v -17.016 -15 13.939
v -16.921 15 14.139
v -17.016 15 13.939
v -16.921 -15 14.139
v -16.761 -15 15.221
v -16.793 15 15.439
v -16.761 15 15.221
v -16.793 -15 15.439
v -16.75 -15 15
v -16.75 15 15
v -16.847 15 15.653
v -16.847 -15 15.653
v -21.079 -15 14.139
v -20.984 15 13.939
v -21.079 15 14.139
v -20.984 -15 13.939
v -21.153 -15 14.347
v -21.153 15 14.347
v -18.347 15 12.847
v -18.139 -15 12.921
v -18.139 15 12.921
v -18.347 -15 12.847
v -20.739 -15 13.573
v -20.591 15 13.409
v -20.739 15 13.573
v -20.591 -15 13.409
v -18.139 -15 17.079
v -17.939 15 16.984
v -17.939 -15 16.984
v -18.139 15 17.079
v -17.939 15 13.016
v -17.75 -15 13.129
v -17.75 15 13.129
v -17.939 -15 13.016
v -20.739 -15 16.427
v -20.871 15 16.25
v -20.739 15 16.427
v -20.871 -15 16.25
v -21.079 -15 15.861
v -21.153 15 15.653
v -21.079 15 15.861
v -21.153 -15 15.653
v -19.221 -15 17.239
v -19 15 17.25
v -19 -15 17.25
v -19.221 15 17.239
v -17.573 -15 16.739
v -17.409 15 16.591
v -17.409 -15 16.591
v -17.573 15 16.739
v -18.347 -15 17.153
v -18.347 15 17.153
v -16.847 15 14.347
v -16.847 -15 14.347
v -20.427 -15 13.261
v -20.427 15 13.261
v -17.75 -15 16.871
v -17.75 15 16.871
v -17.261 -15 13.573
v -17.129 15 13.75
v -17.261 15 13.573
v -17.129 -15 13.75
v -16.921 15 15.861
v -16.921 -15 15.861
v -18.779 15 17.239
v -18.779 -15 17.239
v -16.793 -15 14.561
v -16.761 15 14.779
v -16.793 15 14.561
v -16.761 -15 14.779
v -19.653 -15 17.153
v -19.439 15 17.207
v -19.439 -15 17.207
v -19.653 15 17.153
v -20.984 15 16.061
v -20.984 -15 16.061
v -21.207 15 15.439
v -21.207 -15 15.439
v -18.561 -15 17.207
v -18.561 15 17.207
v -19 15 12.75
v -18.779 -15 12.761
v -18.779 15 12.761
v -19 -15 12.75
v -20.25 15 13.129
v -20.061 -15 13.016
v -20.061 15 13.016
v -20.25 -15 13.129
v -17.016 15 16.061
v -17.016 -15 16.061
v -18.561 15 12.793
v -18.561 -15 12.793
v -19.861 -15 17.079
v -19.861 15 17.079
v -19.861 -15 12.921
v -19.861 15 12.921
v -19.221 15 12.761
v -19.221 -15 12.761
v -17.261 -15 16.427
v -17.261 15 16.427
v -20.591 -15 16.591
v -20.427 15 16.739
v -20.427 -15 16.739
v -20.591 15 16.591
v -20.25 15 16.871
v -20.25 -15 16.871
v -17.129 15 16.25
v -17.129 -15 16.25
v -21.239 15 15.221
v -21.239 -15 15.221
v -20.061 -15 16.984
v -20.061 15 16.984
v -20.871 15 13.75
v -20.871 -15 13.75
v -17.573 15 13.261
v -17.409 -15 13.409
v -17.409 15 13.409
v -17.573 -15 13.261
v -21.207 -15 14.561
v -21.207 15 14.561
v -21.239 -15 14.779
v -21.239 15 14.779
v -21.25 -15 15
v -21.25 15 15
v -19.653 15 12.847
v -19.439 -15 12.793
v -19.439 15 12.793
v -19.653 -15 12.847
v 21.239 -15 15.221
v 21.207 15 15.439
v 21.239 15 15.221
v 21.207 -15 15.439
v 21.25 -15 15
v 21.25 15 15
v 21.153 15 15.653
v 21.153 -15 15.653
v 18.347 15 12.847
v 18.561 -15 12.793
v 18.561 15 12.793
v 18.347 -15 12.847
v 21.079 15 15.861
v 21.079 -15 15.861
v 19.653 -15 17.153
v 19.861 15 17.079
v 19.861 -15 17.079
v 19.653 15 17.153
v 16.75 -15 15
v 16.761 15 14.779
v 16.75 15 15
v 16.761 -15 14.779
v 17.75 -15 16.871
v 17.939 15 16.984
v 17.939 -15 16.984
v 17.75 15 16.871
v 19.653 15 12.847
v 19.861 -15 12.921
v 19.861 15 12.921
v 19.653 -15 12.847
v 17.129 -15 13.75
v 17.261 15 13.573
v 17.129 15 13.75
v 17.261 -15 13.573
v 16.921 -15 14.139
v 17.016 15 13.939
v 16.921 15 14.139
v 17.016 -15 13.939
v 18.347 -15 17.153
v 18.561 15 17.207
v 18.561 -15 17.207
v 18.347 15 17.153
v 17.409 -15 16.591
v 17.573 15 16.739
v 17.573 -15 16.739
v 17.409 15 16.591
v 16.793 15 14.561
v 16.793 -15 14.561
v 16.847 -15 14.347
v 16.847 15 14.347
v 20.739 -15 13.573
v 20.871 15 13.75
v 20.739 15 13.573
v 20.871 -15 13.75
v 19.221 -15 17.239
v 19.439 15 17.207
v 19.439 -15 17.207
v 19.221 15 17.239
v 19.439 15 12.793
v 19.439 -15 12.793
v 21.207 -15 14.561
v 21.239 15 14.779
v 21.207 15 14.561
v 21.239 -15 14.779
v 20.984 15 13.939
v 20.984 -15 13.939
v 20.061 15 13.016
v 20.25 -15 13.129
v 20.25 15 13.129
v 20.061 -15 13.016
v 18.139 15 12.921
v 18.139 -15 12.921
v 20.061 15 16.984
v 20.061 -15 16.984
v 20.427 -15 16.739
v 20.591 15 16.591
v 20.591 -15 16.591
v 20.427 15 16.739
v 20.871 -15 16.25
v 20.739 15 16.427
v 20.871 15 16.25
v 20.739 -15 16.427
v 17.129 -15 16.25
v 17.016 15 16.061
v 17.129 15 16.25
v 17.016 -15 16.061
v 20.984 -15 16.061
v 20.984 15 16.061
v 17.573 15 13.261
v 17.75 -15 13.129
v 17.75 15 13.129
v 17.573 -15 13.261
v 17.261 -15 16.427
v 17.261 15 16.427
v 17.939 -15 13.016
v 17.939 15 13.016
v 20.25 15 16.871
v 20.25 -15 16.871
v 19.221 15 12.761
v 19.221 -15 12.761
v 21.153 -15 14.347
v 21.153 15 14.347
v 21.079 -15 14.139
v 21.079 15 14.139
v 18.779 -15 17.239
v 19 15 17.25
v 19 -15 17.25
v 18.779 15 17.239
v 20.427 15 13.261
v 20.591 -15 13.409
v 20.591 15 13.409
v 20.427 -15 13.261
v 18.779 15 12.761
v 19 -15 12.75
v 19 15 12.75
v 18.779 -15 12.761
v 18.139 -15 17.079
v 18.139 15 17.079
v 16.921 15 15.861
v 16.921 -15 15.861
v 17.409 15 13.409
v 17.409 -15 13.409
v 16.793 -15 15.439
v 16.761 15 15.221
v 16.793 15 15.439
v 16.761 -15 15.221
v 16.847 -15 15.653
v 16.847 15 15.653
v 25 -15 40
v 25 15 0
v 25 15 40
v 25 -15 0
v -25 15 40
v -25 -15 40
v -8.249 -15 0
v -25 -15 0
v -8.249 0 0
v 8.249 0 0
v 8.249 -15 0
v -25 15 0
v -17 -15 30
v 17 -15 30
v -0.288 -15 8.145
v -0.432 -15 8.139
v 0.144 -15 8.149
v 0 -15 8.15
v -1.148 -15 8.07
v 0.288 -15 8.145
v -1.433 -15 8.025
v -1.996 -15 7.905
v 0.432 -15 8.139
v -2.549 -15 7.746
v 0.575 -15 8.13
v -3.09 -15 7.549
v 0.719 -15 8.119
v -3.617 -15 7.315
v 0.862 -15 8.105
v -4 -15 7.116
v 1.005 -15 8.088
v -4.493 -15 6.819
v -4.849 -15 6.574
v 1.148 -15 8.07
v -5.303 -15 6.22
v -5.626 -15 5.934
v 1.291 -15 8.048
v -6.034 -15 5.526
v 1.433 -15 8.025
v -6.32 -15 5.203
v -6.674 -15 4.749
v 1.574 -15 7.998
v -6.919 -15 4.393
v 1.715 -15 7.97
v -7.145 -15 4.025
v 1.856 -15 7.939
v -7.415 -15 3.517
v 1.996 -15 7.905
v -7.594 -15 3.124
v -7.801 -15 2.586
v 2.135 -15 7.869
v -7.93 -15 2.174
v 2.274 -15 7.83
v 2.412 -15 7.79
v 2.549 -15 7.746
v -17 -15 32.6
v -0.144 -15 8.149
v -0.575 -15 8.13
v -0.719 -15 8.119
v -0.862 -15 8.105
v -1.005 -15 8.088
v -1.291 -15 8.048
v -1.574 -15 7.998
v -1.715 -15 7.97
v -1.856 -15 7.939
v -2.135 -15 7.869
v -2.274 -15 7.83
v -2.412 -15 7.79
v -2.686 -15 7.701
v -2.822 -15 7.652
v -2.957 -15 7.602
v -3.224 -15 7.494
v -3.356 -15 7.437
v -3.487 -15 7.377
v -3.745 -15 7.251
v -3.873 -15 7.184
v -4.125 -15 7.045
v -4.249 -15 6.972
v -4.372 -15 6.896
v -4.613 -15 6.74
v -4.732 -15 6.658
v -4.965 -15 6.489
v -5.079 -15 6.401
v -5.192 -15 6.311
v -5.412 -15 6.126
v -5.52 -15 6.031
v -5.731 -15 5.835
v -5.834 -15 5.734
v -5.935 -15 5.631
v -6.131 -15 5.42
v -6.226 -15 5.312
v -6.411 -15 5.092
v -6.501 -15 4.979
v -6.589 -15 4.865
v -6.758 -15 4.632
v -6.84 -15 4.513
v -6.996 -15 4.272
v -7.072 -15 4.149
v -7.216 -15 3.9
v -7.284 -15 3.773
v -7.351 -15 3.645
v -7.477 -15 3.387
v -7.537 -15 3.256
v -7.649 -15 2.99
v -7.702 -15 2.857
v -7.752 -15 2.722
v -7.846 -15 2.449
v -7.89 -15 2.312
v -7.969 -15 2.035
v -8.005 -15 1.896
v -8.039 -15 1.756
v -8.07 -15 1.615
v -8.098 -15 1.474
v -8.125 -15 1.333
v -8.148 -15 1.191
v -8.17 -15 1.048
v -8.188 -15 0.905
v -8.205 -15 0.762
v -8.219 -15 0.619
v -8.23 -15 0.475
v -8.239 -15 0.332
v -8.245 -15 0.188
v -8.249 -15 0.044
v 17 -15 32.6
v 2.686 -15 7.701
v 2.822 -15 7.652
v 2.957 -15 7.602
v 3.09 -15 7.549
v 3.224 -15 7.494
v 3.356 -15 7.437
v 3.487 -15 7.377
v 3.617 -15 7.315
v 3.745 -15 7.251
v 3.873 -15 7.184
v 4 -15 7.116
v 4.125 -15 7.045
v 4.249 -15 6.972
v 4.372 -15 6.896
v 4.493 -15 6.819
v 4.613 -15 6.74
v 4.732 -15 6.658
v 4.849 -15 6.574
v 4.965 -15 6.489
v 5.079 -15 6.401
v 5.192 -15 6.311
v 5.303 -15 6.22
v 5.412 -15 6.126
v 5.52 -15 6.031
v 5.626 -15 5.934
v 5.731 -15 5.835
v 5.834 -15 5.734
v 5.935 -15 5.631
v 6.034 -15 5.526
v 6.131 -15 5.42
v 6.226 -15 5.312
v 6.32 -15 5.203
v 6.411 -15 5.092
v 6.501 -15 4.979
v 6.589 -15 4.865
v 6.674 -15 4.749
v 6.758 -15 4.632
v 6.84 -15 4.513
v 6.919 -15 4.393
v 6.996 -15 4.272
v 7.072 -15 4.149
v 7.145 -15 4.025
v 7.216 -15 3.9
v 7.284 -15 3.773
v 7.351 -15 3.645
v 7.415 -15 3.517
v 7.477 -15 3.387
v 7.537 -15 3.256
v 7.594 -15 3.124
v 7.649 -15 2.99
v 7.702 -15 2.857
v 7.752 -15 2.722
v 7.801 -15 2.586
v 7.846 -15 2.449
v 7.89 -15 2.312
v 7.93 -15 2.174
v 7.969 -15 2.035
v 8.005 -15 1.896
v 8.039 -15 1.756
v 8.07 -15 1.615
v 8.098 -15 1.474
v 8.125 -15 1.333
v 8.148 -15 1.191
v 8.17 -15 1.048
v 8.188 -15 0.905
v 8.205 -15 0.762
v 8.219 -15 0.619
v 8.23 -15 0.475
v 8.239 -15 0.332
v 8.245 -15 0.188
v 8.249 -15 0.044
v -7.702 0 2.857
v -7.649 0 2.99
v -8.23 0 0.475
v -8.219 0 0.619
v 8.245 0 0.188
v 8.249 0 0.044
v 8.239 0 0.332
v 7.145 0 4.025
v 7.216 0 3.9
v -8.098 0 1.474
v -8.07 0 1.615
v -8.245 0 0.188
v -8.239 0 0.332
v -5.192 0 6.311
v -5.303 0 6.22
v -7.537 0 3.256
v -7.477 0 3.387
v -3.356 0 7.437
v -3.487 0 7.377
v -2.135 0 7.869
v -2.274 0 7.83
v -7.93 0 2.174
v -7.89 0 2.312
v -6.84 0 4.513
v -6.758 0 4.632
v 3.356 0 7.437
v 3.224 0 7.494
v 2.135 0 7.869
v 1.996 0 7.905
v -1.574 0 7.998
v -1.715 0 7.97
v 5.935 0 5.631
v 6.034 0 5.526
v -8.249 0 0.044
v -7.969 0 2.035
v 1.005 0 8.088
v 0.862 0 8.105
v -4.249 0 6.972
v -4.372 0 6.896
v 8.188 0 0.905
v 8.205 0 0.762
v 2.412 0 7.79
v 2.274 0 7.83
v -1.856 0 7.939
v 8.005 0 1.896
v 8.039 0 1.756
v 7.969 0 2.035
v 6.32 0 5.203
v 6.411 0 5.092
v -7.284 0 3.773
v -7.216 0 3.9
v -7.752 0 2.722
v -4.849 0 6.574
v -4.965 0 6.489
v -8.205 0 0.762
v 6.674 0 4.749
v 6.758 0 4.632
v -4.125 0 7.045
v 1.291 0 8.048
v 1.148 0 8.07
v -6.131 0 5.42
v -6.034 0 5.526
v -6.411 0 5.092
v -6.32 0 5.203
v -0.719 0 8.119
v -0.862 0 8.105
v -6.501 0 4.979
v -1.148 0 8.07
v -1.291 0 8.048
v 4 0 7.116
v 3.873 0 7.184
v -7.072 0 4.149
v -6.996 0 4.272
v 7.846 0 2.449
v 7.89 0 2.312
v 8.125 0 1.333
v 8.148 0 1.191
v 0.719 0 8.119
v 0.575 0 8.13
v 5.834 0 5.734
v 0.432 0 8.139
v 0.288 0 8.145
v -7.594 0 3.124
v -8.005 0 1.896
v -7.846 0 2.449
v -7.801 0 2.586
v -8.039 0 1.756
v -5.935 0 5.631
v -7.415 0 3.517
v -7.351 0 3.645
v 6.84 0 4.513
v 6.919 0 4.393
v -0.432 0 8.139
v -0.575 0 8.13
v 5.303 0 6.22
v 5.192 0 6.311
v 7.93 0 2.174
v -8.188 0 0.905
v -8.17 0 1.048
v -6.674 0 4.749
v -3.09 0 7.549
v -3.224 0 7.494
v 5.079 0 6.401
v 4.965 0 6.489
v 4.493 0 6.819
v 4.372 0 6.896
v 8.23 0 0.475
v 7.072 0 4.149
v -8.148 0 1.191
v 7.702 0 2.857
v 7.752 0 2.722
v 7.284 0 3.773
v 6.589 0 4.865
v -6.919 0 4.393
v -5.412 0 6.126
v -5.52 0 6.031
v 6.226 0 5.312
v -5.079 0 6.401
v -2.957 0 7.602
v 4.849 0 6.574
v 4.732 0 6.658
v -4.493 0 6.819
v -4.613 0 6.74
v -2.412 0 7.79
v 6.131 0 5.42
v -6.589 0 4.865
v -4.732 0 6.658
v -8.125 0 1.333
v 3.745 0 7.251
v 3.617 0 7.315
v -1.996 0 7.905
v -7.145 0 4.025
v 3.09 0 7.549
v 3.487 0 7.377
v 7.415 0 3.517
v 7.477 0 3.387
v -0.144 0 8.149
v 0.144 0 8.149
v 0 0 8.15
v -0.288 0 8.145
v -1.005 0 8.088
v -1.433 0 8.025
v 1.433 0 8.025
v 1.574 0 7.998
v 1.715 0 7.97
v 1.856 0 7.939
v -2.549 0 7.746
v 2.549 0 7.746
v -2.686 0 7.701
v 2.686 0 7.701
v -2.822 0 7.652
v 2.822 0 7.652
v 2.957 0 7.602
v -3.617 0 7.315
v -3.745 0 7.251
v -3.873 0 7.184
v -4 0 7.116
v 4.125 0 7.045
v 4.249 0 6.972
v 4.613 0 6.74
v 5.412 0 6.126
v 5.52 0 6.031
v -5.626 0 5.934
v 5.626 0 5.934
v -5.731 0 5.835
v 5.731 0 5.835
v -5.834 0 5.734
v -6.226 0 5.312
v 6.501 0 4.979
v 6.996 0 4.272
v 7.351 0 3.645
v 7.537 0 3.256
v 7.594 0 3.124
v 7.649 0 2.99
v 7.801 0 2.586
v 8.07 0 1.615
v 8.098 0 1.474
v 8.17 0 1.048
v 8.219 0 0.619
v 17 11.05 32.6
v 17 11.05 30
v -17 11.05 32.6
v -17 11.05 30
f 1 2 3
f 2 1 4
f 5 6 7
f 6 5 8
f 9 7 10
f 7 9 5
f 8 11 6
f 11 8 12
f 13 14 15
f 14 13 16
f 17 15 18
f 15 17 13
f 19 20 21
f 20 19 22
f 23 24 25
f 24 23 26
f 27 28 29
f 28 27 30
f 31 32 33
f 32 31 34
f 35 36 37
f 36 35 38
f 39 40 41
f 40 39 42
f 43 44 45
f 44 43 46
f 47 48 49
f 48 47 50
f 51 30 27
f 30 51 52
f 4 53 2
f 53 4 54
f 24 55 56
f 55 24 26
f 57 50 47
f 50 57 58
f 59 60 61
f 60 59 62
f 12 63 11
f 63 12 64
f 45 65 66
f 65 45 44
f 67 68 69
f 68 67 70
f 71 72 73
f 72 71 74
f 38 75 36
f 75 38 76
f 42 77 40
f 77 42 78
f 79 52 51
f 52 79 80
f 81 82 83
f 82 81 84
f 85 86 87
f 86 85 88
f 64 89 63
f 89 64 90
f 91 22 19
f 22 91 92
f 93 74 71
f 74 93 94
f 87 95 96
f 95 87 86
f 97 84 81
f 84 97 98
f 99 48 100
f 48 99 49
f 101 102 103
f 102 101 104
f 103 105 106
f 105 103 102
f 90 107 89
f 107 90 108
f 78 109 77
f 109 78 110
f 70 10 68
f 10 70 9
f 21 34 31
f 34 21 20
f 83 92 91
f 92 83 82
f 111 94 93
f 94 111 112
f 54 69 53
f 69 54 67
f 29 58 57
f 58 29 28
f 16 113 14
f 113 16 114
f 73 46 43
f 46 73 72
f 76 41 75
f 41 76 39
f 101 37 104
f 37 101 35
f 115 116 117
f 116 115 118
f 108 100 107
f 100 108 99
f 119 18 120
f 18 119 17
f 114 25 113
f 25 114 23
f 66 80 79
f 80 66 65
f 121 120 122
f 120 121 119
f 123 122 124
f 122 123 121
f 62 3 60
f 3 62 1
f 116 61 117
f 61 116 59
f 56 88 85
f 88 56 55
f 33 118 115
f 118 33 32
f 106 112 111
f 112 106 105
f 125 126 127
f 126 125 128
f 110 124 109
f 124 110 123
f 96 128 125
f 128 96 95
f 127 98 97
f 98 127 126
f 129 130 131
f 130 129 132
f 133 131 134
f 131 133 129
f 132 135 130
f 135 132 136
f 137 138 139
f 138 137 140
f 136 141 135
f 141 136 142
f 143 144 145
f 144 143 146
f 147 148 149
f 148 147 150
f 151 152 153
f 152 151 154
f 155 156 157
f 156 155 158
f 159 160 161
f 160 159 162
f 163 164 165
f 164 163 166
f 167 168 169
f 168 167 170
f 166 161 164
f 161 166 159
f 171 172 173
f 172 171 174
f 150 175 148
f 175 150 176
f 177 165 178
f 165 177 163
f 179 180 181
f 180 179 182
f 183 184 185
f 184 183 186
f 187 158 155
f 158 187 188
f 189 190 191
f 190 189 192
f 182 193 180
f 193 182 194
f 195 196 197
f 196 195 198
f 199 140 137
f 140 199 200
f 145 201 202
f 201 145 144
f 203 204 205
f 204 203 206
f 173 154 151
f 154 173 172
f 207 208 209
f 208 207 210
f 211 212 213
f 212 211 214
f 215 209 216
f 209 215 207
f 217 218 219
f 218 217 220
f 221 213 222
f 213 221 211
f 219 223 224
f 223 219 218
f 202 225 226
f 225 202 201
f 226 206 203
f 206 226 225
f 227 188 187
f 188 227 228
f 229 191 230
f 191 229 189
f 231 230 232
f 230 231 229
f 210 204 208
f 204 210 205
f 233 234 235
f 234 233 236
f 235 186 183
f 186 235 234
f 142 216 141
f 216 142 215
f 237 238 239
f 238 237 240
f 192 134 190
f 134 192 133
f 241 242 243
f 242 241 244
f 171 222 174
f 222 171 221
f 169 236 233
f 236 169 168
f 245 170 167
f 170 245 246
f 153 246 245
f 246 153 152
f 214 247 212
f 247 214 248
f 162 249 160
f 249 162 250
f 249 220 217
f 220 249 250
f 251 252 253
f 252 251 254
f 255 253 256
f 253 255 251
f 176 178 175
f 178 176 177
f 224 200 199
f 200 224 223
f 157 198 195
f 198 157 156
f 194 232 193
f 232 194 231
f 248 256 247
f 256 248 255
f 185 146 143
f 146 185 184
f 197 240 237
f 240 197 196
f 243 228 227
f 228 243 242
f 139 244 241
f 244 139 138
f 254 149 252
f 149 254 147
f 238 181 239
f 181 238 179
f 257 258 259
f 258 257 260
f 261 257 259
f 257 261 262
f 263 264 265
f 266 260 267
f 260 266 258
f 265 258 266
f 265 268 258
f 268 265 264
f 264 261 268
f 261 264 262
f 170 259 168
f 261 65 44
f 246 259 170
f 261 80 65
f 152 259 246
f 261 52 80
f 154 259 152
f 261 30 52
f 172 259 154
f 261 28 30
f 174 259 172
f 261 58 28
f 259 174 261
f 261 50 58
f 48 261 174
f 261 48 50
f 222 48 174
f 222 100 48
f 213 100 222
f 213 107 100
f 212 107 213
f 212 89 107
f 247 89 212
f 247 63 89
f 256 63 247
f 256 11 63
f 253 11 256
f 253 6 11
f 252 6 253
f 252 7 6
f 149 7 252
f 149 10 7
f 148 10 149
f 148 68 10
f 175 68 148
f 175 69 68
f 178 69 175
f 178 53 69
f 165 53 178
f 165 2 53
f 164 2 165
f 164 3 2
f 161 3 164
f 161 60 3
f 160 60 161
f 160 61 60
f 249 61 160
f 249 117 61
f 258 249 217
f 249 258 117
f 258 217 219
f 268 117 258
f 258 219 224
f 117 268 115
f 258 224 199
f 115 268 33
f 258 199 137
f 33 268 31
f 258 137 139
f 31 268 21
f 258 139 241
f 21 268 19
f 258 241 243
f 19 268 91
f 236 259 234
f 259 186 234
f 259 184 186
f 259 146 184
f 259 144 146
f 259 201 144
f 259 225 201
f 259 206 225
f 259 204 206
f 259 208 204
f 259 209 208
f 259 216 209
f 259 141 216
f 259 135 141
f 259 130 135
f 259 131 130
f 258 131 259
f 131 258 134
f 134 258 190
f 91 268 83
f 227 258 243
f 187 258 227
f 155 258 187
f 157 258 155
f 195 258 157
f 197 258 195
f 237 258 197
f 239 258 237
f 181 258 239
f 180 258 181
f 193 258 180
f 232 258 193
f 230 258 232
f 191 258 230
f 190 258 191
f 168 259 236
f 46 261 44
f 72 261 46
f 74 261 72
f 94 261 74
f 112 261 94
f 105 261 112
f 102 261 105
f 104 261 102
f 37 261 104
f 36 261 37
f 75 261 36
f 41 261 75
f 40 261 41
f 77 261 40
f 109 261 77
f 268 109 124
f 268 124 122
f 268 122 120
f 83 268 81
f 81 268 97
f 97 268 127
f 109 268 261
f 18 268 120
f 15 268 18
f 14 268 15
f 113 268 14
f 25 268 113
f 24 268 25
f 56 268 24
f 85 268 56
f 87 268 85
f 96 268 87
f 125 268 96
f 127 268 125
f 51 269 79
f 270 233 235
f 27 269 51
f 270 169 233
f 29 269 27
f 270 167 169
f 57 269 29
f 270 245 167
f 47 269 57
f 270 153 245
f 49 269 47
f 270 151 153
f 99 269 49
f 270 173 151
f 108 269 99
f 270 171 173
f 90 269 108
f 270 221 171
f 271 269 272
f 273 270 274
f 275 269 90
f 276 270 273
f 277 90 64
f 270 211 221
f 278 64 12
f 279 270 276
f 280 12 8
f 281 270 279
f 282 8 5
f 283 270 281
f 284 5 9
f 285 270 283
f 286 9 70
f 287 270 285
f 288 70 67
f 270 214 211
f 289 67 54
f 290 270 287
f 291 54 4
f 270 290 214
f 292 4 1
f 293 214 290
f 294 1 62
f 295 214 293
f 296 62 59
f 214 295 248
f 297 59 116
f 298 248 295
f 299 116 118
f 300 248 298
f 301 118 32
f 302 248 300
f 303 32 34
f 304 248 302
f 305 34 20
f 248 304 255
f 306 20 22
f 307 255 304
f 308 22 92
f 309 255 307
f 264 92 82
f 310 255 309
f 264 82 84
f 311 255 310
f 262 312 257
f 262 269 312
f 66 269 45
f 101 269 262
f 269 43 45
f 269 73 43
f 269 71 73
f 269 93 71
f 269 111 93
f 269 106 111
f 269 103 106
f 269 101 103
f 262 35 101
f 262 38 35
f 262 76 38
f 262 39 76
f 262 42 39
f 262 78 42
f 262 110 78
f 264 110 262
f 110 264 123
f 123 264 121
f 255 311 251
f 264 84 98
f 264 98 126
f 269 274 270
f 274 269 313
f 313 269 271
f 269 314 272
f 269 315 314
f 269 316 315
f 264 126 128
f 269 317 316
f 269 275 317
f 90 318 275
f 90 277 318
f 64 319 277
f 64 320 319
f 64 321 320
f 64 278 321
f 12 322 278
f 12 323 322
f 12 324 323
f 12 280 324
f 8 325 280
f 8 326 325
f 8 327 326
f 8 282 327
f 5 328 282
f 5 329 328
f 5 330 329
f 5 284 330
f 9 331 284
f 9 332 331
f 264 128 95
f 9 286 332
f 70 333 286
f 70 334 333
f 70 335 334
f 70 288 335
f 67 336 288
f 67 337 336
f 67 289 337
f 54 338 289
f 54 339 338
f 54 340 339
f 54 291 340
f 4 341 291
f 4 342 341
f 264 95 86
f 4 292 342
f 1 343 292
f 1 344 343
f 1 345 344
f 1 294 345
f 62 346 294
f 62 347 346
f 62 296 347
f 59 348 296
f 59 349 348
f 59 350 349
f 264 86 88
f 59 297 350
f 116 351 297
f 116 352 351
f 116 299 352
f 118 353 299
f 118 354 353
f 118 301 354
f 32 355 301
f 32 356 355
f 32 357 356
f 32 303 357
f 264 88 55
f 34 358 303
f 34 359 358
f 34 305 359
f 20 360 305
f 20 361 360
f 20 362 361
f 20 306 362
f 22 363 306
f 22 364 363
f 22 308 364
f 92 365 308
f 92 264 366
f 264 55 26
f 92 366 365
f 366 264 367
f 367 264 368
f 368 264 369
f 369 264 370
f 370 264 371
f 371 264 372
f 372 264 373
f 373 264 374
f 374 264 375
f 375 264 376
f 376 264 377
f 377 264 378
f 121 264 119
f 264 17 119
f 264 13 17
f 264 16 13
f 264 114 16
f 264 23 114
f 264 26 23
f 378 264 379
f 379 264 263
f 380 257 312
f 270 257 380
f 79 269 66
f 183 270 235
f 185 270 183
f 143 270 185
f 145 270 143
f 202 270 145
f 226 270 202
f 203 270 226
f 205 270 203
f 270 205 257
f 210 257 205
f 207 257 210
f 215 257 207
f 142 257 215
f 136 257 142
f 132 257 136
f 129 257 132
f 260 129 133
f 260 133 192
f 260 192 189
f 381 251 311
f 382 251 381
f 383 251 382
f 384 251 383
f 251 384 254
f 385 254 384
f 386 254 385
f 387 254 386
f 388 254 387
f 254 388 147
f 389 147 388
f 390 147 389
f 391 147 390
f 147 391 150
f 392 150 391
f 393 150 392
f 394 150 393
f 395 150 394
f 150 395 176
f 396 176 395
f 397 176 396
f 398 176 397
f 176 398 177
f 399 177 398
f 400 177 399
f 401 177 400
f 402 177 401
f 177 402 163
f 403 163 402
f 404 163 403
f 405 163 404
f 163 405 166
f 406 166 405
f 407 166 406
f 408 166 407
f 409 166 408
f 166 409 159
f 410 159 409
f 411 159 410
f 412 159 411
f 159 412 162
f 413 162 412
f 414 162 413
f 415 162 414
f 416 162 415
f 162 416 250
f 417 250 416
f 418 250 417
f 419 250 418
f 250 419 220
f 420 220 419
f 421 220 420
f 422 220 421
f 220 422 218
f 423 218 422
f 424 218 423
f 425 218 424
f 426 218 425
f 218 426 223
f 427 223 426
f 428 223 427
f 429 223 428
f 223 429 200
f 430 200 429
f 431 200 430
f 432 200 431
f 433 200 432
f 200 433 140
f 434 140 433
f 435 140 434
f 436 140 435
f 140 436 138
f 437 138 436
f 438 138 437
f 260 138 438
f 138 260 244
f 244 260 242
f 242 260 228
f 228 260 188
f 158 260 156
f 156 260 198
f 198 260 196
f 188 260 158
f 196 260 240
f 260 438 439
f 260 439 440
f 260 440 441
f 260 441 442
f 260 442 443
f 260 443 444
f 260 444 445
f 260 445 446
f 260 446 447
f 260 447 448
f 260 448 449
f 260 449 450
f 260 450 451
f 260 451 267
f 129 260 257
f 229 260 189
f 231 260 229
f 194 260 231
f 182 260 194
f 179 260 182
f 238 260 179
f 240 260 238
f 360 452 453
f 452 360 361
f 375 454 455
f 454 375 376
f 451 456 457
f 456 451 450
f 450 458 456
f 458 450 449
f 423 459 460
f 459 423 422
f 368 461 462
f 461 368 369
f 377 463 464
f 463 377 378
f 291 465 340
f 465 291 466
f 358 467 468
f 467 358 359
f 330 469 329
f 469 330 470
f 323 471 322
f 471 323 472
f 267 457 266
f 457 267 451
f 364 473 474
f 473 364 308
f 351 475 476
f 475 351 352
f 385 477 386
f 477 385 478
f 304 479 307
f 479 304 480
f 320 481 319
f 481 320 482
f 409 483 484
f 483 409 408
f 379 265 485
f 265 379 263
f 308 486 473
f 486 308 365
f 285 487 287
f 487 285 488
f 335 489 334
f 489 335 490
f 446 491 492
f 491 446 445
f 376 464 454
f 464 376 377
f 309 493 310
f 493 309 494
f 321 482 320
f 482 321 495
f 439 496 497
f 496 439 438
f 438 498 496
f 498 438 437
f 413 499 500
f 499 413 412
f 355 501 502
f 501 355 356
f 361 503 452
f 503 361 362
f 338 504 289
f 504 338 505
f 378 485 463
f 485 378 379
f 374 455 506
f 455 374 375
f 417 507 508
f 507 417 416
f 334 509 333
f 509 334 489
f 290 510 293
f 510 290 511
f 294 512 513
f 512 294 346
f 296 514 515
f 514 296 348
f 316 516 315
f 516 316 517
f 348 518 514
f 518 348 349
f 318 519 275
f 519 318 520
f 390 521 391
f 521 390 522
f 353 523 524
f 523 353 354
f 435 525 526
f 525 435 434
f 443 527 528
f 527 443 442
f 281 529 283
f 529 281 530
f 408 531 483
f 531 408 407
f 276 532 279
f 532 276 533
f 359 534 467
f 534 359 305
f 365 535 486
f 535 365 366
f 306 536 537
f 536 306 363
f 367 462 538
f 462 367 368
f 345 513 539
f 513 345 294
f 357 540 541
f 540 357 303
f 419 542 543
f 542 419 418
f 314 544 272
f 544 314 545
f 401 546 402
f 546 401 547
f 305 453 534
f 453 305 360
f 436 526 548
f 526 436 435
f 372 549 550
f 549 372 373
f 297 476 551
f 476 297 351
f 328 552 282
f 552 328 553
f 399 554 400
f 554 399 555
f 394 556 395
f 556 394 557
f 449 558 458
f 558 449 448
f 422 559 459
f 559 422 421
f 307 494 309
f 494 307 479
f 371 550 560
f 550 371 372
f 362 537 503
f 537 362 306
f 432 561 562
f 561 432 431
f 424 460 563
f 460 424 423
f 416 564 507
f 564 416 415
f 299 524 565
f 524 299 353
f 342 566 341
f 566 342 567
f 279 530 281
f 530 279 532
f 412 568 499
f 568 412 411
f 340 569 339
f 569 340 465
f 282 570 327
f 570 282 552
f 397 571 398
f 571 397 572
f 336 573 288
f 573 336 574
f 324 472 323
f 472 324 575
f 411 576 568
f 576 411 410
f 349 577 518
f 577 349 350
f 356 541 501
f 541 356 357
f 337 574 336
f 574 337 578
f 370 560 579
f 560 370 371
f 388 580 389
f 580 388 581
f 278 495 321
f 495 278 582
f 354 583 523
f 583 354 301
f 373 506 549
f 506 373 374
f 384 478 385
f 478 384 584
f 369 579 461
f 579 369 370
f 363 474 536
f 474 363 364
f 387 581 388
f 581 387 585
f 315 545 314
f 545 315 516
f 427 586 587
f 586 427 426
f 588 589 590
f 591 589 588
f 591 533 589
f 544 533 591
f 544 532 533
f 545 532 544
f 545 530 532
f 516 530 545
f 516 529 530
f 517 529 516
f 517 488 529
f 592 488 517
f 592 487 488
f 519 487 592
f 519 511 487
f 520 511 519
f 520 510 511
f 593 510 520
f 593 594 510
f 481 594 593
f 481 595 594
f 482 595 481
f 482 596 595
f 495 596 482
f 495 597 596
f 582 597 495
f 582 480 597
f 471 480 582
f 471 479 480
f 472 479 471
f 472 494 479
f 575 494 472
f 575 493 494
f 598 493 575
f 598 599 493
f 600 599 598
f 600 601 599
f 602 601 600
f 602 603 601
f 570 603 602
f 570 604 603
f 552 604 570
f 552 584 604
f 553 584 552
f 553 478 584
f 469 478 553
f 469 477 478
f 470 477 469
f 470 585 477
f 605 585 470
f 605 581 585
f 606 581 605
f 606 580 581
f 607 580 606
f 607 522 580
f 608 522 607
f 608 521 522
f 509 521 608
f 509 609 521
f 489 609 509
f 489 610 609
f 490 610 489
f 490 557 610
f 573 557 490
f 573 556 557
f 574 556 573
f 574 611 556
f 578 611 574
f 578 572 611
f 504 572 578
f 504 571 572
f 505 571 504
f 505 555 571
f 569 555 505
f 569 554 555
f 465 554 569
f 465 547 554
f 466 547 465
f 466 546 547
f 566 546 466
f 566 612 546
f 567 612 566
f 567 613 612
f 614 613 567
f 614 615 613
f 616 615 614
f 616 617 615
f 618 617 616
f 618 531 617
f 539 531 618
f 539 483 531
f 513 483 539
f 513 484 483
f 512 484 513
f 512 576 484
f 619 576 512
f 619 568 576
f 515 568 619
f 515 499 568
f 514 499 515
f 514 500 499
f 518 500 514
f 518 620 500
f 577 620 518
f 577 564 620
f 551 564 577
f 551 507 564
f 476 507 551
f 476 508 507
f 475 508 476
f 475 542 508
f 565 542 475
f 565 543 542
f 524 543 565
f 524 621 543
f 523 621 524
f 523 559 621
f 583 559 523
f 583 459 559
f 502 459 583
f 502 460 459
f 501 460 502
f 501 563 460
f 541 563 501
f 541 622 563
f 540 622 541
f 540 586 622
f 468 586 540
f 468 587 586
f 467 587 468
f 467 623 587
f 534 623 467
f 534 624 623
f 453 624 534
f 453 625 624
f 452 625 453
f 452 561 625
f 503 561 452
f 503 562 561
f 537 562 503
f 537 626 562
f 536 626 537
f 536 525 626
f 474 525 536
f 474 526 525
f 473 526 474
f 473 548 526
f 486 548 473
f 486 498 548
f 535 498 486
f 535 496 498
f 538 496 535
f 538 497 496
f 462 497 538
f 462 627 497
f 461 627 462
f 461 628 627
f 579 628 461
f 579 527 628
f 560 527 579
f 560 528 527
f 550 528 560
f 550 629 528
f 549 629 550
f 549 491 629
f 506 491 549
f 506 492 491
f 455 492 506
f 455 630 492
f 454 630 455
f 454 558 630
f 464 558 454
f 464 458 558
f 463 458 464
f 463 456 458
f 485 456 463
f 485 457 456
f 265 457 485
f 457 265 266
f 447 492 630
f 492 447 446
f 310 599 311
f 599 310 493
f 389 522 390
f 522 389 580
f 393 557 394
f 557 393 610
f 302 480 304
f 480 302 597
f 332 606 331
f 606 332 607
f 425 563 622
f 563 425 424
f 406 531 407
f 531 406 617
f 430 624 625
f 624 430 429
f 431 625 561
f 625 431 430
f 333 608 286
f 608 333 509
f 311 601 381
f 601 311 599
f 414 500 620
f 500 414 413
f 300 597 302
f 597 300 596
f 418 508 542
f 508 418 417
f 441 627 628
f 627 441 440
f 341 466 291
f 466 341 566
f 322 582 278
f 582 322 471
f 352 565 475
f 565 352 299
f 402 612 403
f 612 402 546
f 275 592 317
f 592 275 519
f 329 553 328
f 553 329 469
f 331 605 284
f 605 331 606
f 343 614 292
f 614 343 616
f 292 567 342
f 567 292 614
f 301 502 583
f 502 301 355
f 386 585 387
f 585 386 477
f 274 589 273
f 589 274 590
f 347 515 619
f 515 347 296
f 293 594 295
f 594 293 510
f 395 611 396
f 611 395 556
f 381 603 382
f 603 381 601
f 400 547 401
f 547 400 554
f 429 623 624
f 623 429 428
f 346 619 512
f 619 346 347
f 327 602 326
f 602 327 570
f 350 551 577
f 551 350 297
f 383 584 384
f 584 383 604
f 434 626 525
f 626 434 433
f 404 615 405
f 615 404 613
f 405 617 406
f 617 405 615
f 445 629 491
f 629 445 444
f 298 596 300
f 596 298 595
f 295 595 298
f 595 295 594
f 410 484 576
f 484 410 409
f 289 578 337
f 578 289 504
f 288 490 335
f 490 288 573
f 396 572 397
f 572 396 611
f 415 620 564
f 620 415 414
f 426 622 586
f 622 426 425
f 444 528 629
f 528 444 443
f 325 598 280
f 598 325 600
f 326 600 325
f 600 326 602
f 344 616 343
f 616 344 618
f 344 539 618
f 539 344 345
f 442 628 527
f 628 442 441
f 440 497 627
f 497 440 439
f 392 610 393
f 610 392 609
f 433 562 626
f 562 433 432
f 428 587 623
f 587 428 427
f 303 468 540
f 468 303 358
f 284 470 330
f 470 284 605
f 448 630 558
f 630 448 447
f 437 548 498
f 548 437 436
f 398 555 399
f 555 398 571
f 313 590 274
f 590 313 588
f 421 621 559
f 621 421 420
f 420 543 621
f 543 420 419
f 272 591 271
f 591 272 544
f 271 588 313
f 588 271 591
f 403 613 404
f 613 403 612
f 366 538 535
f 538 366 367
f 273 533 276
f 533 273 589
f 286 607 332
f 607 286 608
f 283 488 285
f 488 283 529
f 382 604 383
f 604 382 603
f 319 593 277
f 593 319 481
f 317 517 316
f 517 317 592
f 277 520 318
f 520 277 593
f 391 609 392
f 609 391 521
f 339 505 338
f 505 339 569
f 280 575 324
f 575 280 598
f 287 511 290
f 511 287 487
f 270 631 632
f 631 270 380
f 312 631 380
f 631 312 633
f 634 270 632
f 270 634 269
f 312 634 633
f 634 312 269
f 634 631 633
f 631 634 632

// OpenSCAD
$fn = 64;

// Dimensions
block_width = 50;      // X
block_depth = 30;      // Y
block_height = 40;     // Z
barrel_radius = 8.25;  // half of 16.5 mm width
barrel_channel_length = 15;  // from y=0 to y=-15
flange_slot_width = 34;
flange_slot_height = 2.6;
flange_slot_z_start = 30;
screw_hole_diameter = 4.5;
screw_hole_x = [-19, 19];
screw_hole_z = 15;

difference() {
    // Main block: 50 x 30 x 40, centered on origin in XY, standing on bed (z=0 to 40)
    translate([0, 0, 20]) {
        cube([block_width, block_depth, block_height], center=true);
    }
    
    // Barrel channel: half-cylinder from y=-15 (front) to y=0 (back)
    // Flat side at z=0, curved side up to z=8.25
    translate([0, 0, -0.1]) {
        rotate([90, 0, 0]) {
            linear_extrude(height = barrel_channel_length + 0.1, center = false) {
                polygon([
                    for (angle = [0 : 1 : 180]) 
                        [barrel_radius * cos(angle), barrel_radius * sin(angle)]
                ]);
            }
        }
    }
    
    // Flange slot: 34 mm wide (centered in X), 2.6 mm tall (z=30 to 32.6)
    // Cut from front face (y=-15) back to y=11
    translate([0, -2, 31.3]) {
        cube([flange_slot_width, 26.1, flange_slot_height], center=true);
    }
    
    // Screw holes: 4.5 mm diameter, at x=-19 and x=19, z=15
    // Go straight through from front to back (along Y)
    for (x = screw_hole_x) {
        translate([x, 0, screw_hole_z]) {
            rotate([90, 0, 0]) {
                cylinder(h=30.1, r=screw_hole_diameter/2, center=true);
            }
        }
    }
}
